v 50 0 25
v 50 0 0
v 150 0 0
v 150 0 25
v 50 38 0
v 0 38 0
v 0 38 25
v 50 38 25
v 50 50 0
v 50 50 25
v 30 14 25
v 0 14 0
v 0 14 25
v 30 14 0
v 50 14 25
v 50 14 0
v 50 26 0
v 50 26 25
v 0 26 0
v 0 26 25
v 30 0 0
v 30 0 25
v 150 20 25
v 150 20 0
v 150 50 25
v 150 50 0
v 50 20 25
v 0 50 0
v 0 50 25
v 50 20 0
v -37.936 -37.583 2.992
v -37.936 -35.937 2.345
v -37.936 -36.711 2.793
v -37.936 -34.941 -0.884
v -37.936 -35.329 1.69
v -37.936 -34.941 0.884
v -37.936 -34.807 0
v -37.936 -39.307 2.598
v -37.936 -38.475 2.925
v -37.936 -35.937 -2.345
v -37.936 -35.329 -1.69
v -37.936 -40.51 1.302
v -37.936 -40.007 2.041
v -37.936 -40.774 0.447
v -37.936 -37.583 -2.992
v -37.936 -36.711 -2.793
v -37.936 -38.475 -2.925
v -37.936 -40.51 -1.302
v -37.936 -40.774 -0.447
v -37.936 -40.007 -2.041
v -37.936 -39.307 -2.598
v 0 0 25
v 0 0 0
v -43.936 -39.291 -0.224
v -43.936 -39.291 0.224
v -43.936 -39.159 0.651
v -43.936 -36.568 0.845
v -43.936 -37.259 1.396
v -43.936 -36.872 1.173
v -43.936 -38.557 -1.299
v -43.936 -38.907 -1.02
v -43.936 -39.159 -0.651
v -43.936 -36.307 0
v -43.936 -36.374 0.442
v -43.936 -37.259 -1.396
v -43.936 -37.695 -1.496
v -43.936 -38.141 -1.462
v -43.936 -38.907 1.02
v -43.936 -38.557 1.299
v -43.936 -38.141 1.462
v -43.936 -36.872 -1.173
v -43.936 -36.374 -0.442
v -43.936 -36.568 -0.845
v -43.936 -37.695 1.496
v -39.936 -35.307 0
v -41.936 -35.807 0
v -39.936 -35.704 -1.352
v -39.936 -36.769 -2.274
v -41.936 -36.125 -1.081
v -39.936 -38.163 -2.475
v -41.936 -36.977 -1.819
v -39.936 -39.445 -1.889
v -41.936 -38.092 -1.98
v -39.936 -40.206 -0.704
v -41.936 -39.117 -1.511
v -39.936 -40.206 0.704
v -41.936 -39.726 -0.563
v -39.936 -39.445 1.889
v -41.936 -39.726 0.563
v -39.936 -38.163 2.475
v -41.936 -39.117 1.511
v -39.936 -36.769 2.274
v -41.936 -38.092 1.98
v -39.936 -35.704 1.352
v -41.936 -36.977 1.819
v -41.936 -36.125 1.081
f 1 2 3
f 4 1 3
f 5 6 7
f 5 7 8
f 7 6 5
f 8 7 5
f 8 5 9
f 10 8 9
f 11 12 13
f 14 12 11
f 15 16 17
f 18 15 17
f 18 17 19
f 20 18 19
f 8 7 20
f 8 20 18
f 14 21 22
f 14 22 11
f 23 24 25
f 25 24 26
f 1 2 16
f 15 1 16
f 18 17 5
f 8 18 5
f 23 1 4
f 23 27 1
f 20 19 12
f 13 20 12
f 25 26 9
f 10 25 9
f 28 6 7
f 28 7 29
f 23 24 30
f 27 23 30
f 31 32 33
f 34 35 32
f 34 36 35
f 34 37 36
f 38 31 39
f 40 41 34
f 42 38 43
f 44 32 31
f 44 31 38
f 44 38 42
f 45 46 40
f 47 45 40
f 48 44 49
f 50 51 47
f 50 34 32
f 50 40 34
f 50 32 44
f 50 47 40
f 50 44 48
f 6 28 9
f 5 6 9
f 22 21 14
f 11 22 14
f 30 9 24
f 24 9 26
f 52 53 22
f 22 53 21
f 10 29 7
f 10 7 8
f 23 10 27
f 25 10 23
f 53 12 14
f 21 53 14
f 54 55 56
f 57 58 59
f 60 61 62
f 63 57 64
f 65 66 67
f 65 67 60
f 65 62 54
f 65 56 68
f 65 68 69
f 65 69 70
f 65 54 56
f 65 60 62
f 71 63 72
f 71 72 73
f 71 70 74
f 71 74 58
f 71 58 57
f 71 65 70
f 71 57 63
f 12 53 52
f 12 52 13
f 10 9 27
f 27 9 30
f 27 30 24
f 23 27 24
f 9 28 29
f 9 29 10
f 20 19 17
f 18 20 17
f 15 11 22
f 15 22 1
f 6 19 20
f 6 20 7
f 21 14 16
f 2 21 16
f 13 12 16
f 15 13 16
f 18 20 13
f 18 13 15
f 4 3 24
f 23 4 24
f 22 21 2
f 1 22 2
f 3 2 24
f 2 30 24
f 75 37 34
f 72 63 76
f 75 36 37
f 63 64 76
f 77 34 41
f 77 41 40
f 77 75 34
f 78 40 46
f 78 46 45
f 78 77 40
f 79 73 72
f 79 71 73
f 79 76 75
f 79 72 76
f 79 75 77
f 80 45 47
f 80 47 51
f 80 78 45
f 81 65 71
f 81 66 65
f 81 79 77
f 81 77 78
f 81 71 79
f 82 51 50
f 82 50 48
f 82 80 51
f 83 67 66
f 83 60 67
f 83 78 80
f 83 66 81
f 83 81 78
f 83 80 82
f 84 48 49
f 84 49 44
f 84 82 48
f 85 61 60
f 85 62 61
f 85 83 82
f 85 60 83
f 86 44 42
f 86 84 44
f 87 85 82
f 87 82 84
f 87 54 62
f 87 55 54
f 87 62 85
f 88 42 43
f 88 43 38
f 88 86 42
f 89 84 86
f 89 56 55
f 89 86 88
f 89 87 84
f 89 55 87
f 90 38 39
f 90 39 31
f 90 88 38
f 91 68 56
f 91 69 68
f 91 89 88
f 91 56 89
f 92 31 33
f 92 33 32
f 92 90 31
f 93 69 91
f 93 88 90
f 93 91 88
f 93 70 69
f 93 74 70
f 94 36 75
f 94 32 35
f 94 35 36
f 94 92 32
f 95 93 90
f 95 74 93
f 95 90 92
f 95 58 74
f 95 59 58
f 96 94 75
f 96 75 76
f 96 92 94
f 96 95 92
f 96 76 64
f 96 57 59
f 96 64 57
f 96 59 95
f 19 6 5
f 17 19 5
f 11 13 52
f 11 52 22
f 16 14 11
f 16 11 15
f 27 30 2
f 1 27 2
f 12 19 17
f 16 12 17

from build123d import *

# Parameters (mm, degrees)
F0_W     = 50
F0_H     = 12
F1_DEPTH = 25
F0_W_2   = 30
F0_H_2   = 14
F2_DEPTH = 25
F0_W_3   = 20
F3_DEPTH = 25


with BuildPart() as f1:
    # F0 (on Top) → F1 (new body)
    with BuildSketch(Plane.XY):
        with Locations((25, 44)):
            Rectangle(F0_W, F0_H)
        Polygon((0, 26), (0, 14), (30, 14), (50, 14), (50, 20), (50, 26), align=None)
    extrude(amount=F1_DEPTH)


with BuildPart() as f2:
    # F0 (on Top) → F2 (new body)
    with BuildSketch(Plane.XY):
        with Locations((25, 32)):
            Rectangle(F0_W, F0_H)
        with Locations((15, 7)):
            Rectangle(F0_W_2, F0_H_2)
        Polygon((50, 14), (50, 0), (150, 0), (150, 20), (50, 20), align=None)
    extrude(amount=F2_DEPTH)


with BuildPart() as f3:
    # F0 (on Top) → F3 (new body)
    with BuildSketch(Plane.XY):
        Polygon((50, 38), (50, 26), (50, 20), (150, 20), (150, 50), (50, 50), align=None)
        with Locations((40, 7)):
            Rectangle(F0_W_3, F0_H_2)
    extrude(amount=F3_DEPTH)


with BuildPart() as f5:
    # F4 (on Top) → F5 (revolve)
    with BuildSketch(Plane.XY):
        Polygon((-37.936111, -37.807407), (-37.936111, -34.807407), (-43.936111, -36.307407), (-43.936111, -37.807407), align=None)
    revolve(axis=Axis((-40.936111, -37.807407, 0), (-1, 0, 0)))


solid = Compound([f1.part, f2.part, f3.part, f5.part])
